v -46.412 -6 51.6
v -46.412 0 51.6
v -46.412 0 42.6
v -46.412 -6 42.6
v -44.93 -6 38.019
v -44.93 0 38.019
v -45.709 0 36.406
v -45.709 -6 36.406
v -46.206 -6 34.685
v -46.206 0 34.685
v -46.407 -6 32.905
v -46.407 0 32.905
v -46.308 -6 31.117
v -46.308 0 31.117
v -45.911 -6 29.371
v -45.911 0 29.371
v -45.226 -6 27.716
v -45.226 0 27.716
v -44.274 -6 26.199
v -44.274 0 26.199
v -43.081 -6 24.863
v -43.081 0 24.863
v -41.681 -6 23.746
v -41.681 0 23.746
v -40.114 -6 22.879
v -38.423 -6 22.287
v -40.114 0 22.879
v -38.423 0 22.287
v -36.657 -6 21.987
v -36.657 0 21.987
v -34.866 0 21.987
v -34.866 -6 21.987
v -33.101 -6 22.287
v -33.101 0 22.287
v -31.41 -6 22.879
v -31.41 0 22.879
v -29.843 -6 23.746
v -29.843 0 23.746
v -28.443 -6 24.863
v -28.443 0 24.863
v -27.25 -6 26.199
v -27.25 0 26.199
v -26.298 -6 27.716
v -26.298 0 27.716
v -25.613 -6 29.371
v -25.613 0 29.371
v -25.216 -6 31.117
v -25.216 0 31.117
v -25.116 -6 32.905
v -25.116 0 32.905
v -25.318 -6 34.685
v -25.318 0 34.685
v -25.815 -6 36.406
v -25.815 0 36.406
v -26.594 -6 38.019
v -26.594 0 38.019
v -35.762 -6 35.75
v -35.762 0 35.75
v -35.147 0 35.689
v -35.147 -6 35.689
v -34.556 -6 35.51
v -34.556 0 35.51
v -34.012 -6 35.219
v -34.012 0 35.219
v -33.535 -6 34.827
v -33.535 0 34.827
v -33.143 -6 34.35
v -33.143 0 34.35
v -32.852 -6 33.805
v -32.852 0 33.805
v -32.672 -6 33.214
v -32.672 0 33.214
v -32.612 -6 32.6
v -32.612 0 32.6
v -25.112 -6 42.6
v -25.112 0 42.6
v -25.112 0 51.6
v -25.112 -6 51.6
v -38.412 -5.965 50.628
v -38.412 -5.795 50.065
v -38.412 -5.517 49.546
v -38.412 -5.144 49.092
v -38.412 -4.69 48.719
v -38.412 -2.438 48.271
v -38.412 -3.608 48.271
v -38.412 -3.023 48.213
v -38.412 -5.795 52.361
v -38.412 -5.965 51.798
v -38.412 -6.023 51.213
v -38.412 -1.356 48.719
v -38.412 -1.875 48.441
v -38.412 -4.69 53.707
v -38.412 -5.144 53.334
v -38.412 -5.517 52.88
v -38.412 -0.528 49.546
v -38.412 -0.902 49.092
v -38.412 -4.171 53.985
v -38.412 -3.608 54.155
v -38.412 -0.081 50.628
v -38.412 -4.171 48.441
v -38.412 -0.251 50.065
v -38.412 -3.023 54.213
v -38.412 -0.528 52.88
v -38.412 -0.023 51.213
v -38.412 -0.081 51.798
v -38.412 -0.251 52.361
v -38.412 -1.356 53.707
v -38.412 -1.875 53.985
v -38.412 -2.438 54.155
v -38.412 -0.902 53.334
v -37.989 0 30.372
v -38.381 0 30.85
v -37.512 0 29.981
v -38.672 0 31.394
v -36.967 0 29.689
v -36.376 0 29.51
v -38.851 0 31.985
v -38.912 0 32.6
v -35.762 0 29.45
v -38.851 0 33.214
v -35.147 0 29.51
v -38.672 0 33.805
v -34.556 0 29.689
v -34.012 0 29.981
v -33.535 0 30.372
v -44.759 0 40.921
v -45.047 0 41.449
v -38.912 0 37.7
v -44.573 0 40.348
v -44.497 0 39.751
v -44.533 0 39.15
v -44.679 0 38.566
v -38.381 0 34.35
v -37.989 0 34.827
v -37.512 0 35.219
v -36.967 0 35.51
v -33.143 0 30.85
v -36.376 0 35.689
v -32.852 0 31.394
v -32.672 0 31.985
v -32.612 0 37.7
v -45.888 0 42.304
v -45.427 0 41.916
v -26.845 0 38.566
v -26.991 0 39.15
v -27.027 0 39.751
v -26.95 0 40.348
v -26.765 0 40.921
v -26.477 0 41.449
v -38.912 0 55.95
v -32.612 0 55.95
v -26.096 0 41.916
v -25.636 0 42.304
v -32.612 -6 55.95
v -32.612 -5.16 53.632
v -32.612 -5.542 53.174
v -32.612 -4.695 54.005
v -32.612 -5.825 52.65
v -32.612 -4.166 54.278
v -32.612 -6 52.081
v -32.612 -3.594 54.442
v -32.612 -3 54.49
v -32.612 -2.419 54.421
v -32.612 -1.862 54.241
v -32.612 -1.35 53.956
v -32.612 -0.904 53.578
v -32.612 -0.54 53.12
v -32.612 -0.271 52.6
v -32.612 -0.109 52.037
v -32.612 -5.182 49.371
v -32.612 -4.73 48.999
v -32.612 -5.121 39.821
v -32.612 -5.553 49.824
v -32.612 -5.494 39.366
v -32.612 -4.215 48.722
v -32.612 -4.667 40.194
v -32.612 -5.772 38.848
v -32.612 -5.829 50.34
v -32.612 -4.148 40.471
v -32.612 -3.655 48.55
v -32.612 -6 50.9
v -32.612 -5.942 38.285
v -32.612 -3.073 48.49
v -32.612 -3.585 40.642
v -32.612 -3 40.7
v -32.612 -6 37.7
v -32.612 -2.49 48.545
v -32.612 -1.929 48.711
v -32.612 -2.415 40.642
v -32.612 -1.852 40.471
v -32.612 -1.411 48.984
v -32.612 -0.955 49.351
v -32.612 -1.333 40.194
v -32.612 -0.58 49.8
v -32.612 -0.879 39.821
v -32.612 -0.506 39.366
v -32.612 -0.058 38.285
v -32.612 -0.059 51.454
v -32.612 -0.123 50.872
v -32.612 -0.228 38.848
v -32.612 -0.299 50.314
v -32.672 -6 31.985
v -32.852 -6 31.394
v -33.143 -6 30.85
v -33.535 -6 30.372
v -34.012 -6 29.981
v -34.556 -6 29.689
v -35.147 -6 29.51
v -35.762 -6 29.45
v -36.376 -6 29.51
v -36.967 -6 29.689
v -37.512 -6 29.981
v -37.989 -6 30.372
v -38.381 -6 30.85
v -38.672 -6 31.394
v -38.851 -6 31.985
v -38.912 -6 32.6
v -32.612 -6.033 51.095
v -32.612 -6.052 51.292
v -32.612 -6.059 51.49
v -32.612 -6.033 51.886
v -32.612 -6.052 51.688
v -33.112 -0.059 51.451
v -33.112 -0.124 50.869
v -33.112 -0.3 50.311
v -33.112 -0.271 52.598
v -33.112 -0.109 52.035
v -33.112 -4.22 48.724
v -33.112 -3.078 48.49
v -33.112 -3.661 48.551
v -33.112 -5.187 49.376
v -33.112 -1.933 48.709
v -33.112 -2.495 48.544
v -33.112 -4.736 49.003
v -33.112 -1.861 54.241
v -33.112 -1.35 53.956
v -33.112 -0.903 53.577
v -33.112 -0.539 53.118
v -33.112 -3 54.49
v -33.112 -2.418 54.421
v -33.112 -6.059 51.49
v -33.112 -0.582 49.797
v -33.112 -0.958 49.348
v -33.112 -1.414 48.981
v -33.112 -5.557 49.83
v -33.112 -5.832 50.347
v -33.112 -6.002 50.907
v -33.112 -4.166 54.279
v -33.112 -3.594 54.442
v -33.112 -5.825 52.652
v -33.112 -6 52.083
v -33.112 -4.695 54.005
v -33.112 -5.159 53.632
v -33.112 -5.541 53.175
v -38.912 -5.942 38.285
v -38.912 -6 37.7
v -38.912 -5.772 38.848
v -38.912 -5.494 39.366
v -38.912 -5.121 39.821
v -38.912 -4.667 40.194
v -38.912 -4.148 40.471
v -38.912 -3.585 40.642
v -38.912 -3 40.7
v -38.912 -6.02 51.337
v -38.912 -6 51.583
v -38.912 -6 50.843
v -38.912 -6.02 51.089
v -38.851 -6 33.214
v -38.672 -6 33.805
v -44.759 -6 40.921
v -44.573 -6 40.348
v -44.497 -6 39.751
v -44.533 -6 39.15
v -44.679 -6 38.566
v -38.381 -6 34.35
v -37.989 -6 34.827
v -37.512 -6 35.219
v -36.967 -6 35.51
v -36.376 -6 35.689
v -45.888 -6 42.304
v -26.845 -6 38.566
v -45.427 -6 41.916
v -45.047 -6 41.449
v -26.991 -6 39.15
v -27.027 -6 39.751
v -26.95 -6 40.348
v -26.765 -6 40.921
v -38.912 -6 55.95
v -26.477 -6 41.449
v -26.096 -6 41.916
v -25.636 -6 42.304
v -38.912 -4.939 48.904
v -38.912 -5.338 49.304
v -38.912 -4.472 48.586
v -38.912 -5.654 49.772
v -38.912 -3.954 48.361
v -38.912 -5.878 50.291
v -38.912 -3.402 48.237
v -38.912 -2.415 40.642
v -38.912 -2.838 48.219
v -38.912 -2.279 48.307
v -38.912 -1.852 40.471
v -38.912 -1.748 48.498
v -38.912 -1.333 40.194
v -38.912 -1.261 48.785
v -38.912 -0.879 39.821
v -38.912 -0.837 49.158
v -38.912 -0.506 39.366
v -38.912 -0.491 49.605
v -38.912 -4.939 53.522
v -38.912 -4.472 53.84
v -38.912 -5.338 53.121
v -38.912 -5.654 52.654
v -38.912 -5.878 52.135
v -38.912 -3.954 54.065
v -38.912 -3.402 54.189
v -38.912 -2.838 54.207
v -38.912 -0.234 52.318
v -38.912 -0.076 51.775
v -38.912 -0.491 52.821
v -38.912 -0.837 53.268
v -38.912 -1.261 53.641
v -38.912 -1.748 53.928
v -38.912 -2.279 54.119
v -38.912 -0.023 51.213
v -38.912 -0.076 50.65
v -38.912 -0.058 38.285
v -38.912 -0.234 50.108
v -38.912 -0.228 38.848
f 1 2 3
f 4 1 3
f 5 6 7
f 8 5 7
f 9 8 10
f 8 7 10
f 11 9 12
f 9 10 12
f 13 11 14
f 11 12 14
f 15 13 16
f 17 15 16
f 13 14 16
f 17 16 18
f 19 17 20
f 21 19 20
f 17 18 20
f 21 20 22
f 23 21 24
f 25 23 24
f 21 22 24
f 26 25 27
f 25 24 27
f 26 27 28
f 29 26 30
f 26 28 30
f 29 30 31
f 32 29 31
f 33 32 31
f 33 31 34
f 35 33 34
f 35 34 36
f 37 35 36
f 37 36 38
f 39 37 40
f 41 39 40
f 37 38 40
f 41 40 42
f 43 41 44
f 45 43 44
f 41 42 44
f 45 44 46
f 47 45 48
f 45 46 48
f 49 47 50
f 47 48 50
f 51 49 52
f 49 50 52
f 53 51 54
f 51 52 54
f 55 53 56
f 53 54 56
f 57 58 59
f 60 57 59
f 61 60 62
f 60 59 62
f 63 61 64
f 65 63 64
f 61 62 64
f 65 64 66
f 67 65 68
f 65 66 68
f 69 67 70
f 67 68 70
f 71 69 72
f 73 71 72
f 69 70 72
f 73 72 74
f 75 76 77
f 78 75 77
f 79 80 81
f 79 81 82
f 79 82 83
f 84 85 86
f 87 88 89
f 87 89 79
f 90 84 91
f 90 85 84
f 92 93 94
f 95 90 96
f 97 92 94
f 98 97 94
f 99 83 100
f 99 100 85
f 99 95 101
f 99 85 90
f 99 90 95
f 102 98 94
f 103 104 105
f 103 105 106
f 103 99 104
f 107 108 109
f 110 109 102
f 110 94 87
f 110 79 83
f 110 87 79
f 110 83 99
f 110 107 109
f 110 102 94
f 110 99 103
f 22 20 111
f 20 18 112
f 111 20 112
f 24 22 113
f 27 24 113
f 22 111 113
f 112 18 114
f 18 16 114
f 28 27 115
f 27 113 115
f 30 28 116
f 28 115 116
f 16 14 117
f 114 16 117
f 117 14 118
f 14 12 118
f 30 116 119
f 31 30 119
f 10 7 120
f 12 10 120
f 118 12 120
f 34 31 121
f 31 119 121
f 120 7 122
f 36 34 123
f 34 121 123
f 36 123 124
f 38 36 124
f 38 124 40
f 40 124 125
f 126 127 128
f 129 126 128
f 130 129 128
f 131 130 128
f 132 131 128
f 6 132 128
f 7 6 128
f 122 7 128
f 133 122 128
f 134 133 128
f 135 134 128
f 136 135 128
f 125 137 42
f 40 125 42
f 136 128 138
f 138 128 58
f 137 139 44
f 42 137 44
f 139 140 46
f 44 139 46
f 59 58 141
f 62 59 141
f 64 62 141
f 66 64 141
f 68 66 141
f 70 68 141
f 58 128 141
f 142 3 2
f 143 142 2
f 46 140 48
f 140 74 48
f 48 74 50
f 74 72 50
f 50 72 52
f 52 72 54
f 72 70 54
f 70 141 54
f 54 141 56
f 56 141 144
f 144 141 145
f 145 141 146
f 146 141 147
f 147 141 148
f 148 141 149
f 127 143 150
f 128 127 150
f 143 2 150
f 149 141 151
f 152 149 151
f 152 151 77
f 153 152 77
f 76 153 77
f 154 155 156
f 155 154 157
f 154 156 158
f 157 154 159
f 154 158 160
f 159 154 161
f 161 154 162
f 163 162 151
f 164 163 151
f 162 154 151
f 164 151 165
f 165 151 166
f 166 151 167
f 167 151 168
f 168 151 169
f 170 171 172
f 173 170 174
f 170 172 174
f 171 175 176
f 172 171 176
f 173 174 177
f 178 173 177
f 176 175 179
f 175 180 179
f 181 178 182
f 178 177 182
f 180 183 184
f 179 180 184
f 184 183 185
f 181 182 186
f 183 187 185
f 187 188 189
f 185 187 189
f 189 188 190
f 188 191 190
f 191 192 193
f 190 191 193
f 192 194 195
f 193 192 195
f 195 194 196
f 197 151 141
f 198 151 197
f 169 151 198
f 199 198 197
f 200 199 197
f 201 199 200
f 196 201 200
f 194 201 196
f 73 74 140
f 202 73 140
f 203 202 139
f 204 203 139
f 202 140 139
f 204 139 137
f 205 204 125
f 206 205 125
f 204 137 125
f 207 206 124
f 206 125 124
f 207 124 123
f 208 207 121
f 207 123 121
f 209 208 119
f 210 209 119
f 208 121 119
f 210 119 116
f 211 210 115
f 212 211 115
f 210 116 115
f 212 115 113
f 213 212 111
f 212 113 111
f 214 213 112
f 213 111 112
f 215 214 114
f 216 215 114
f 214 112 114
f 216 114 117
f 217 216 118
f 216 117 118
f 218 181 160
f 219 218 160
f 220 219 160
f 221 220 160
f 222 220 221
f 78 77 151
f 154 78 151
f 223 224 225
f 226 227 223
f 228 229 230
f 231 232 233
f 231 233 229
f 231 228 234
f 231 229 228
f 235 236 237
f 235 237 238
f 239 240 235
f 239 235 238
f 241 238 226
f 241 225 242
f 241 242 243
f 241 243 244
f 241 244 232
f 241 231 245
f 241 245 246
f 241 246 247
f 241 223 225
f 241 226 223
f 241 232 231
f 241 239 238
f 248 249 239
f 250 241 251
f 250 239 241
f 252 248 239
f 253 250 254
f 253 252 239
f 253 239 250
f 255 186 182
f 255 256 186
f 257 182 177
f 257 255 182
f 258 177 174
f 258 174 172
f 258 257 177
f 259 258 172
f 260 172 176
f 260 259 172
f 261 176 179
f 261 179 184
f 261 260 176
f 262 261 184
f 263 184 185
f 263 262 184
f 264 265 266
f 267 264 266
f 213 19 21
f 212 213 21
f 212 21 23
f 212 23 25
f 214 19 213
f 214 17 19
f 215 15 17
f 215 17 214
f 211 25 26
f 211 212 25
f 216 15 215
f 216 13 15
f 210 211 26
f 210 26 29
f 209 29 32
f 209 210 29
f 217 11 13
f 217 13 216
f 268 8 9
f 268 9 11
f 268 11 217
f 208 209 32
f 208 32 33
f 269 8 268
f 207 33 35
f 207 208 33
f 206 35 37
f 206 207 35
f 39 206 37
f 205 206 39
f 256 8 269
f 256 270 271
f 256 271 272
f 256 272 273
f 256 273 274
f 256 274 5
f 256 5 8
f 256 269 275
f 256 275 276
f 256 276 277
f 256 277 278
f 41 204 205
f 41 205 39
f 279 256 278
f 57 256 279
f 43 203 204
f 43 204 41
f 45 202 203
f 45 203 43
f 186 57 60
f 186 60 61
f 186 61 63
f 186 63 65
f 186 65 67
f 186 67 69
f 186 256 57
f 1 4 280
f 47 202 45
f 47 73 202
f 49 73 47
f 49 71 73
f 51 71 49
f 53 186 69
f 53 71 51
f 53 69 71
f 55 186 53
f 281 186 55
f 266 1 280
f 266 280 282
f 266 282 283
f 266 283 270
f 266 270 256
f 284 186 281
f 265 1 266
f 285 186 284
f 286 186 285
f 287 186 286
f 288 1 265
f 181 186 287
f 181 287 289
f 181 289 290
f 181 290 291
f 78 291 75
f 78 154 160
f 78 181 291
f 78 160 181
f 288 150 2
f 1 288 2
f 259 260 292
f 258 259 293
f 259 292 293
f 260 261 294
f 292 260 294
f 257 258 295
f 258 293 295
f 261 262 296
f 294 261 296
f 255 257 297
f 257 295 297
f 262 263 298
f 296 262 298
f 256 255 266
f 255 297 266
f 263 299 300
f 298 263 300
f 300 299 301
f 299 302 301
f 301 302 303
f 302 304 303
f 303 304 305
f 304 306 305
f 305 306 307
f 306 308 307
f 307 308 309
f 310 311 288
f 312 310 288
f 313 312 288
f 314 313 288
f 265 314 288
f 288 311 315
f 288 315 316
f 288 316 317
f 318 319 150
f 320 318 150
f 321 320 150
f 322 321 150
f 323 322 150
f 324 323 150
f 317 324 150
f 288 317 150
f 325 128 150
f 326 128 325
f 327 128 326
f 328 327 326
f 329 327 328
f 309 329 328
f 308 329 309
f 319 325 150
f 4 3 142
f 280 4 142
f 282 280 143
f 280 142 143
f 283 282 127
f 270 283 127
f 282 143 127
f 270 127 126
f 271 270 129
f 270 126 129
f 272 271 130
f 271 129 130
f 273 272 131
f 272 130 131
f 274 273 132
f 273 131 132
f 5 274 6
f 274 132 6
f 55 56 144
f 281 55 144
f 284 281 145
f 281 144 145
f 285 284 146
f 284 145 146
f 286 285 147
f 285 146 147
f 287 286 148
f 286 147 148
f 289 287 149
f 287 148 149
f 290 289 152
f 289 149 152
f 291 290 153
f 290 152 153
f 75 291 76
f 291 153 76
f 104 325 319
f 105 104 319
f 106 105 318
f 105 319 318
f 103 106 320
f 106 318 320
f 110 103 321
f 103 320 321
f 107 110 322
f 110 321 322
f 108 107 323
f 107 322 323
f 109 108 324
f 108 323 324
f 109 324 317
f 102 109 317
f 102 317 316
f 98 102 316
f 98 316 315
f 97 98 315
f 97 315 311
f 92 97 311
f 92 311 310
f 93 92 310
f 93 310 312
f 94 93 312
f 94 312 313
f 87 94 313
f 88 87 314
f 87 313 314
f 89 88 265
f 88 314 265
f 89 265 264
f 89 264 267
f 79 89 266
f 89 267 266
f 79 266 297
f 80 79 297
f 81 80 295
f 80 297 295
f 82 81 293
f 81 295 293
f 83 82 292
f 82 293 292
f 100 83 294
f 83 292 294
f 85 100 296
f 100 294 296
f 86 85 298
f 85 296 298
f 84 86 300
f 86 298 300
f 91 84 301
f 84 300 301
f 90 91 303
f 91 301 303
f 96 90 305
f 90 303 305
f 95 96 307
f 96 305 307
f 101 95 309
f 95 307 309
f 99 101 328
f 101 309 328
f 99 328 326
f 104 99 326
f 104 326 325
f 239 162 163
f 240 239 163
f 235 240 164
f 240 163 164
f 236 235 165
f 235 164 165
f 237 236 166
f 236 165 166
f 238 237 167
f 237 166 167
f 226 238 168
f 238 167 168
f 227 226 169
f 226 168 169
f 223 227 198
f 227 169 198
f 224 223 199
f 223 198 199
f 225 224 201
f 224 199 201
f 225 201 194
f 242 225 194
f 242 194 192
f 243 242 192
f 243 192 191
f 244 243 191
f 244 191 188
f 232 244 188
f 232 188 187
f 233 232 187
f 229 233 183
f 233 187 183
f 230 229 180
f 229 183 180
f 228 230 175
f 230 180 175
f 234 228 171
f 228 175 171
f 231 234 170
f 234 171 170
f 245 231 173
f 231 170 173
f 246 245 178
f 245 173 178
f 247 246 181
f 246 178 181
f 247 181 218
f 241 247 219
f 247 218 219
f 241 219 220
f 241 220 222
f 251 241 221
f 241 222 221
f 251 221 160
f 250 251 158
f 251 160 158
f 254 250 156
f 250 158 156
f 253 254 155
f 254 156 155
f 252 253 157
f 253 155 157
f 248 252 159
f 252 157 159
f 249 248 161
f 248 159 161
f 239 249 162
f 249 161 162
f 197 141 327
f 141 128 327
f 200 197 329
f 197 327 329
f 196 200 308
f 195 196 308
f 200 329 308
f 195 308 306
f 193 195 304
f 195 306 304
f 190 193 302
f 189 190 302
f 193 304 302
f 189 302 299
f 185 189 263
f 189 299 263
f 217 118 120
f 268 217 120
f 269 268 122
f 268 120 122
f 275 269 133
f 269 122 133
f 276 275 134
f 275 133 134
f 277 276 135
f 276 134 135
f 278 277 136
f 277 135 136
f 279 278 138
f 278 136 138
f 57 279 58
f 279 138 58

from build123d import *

# Parameters (mm, degrees)
F1_DEPTH = 6
F3_DEPTH = 0.5
F4_R     = 3
F5_DEPTH = 0.5
F6_DEPTH = 6
F7_R     = 3
F8_R     = 2.99999


# Not quite as in the source:
# - a fillet or chamfer is up to 0.001 mm smaller than in the source, because OpenCascade refuses the exact size


with BuildPart() as f1:
    # F0 (on Front) → F1 (new body)
    with BuildSketch(Plane.XZ):
        with BuildLine():
            Line((-38.9118868113, 40.6996482372), (-38.9118868113, 42.7731432119))
            ThreePointArc((-38.9118868113, 42.7731432119), (-42.3638979782, 40.9564388024), (-44.9301813825, 38.0185849093))
            ThreePointArc((-44.9301813825, 38.0185849093), (-35.7618868113, 21.9496482372), (-26.59359224, 38.0185849093))
            ThreePointArc((-26.59359224, 38.0185849093), (-29.1598756443, 40.9564388024), (-32.6118868113, 42.7731432119))
            Line((-32.6118868113, 42.7731432119), (-32.6118868113, 40.6996482372))
            Line((-32.6118868113, 40.6996482372), (-35.7618868113, 40.6996482372))
            Line((-35.7618868113, 40.6996482372), (-38.9118868113, 40.6996482372))
        make_face()
        with BuildLine():
            ThreePointArc((-35.7618868113, 35.7496482372), (-33.5345004505, 34.827034598), (-32.6118868113, 32.5996482372))
            ThreePointArc((-32.6118868113, 32.5996482372), (-35.7618868113, 29.4496482372), (-38.9118868113, 32.5996482372))
            ThreePointArc((-38.9118868113, 32.5996482372), (-37.989273172, 34.827034598), (-35.7618868113, 35.7496482372))
        make_face(mode=Mode.SUBTRACT)
        with BuildLine():
            ThreePointArc((-44.9301813825, 38.0185849093), (-42.3638979782, 40.9564388024), (-38.9118868113, 42.7731432119))
            Line((-38.9118868113, 42.7731432119), (-38.9118868113, 55.9496482372))
            Line((-38.9118868113, 55.9496482372), (-46.4118868113, 51.5996482372))
            Line((-46.4118868113, 51.5996482372), (-46.4118868113, 42.5996482372))
            ThreePointArc((-46.4118868113, 42.5996482372), (-44.652769306, 40.6384655389), (-44.9301813825, 38.0185849093))
        make_face()
        with BuildLine():
            ThreePointArc((-32.6118868113, 42.7731432119), (-29.1598756443, 40.9564388024), (-26.59359224, 38.0185849093))
            ThreePointArc((-26.59359224, 38.0185849093), (-26.8710043165, 40.6384655389), (-25.1118868113, 42.5996482372))
            Line((-25.1118868113, 42.5996482372), (-25.1118868113, 51.5996482372))
            Line((-25.1118868113, 51.5996482372), (-32.6118868113, 55.9496482372))
            Line((-32.6118868113, 55.9496482372), (-32.6118868113, 42.7731432119))
        make_face()
    extrude(amount=F1_DEPTH)

    # F2 (on face) → F3 (join)
    with BuildSketch(Plane(origin=(-32.6118868113, 0, 0), x_dir=(0, -1, 0), z_dir=(-1, 0, 0))):
        with BuildLine():
            ThreePointArc((3, 54.4897693761), (0.9582631067, 49.3483636635), (6.0587201472, 51.4903441072))
            ThreePointArc((6.0587201472, 51.4903441072), (5.1591771878, 53.6323245508), (3, 54.4897693761))
        make_face()
    extrude(amount=F3_DEPTH)

    # F4 (on face) → F5 (join)
    with BuildSketch(Plane.YZ.offset(-38.9118868113)):
        with Locations((-3.0229054391, 51.2129813433)):
            Circle(F4_R)
    extrude(amount=F5_DEPTH)

    # F0 (on Front) → F6 (join)
    with BuildSketch(Plane.XZ):
        with BuildLine():
            Line((-38.9118868113, 40.6996482372), (-38.9118868113, 42.7731432119))
            ThreePointArc((-38.9118868113, 42.7731432119), (-42.3638979782, 40.9564388024), (-44.9301813825, 38.0185849093))
            ThreePointArc((-44.9301813825, 38.0185849093), (-35.7618868113, 21.9496482372), (-26.59359224, 38.0185849093))
            ThreePointArc((-26.59359224, 38.0185849093), (-29.1598756443, 40.9564388024), (-32.6118868113, 42.7731432119))
            Line((-32.6118868113, 42.7731432119), (-32.6118868113, 40.6996482372))
            Line((-32.6118868113, 40.6996482372), (-35.7618868113, 40.6996482372))
            Line((-35.7618868113, 40.6996482372), (-38.9118868113, 40.6996482372))
        make_face()
        with BuildLine():
            ThreePointArc((-35.7618868113, 35.7496482372), (-33.5345004505, 34.827034598), (-32.6118868113, 32.5996482372))
            ThreePointArc((-32.6118868113, 32.5996482372), (-35.7618868113, 29.4496482372), (-38.9118868113, 32.5996482372))
            ThreePointArc((-38.9118868113, 32.5996482372), (-37.989273172, 34.827034598), (-35.7618868113, 35.7496482372))
        make_face(mode=Mode.SUBTRACT)
        with BuildLine():
            ThreePointArc((-44.9301813825, 38.0185849093), (-42.3638979782, 40.9564388024), (-38.9118868113, 42.7731432119))
            Line((-38.9118868113, 42.7731432119), (-38.9118868113, 55.9496482372))
            Line((-38.9118868113, 55.9496482372), (-46.4118868113, 51.5996482372))
            Line((-46.4118868113, 51.5996482372), (-46.4118868113, 42.5996482372))
            ThreePointArc((-46.4118868113, 42.5996482372), (-44.652769306, 40.6384655389), (-44.9301813825, 38.0185849093))
        make_face()
        with BuildLine():
            ThreePointArc((-32.6118868113, 42.7731432119), (-29.1598756443, 40.9564388024), (-26.59359224, 38.0185849093))
            ThreePointArc((-26.59359224, 38.0185849093), (-26.8710043165, 40.6384655389), (-25.1118868113, 42.5996482372))
            Line((-25.1118868113, 42.5996482372), (-25.1118868113, 51.5996482372))
            Line((-25.1118868113, 51.5996482372), (-32.6118868113, 55.9496482372))
            Line((-32.6118868113, 55.9496482372), (-32.6118868113, 42.7731432119))
        make_face()
    extrude(amount=F6_DEPTH)

    # F7
    f7_edges = [f1.edges().sort_by_distance(p)[0] for p in [
        (-35.761887, -6, 40.699648),
    ]]
    fillet(f7_edges, radius=F7_R)

    # F8 (radius 3 in the source; OpenCascade refuses exactly that, so slightly less here)
    f8_edges = [f1.edges().sort_by_distance(p)[0] for p in [
        (-35.761887, 0, 40.699648),
    ]]
    fillet(f8_edges, radius=F8_R)


solid = f1.part
